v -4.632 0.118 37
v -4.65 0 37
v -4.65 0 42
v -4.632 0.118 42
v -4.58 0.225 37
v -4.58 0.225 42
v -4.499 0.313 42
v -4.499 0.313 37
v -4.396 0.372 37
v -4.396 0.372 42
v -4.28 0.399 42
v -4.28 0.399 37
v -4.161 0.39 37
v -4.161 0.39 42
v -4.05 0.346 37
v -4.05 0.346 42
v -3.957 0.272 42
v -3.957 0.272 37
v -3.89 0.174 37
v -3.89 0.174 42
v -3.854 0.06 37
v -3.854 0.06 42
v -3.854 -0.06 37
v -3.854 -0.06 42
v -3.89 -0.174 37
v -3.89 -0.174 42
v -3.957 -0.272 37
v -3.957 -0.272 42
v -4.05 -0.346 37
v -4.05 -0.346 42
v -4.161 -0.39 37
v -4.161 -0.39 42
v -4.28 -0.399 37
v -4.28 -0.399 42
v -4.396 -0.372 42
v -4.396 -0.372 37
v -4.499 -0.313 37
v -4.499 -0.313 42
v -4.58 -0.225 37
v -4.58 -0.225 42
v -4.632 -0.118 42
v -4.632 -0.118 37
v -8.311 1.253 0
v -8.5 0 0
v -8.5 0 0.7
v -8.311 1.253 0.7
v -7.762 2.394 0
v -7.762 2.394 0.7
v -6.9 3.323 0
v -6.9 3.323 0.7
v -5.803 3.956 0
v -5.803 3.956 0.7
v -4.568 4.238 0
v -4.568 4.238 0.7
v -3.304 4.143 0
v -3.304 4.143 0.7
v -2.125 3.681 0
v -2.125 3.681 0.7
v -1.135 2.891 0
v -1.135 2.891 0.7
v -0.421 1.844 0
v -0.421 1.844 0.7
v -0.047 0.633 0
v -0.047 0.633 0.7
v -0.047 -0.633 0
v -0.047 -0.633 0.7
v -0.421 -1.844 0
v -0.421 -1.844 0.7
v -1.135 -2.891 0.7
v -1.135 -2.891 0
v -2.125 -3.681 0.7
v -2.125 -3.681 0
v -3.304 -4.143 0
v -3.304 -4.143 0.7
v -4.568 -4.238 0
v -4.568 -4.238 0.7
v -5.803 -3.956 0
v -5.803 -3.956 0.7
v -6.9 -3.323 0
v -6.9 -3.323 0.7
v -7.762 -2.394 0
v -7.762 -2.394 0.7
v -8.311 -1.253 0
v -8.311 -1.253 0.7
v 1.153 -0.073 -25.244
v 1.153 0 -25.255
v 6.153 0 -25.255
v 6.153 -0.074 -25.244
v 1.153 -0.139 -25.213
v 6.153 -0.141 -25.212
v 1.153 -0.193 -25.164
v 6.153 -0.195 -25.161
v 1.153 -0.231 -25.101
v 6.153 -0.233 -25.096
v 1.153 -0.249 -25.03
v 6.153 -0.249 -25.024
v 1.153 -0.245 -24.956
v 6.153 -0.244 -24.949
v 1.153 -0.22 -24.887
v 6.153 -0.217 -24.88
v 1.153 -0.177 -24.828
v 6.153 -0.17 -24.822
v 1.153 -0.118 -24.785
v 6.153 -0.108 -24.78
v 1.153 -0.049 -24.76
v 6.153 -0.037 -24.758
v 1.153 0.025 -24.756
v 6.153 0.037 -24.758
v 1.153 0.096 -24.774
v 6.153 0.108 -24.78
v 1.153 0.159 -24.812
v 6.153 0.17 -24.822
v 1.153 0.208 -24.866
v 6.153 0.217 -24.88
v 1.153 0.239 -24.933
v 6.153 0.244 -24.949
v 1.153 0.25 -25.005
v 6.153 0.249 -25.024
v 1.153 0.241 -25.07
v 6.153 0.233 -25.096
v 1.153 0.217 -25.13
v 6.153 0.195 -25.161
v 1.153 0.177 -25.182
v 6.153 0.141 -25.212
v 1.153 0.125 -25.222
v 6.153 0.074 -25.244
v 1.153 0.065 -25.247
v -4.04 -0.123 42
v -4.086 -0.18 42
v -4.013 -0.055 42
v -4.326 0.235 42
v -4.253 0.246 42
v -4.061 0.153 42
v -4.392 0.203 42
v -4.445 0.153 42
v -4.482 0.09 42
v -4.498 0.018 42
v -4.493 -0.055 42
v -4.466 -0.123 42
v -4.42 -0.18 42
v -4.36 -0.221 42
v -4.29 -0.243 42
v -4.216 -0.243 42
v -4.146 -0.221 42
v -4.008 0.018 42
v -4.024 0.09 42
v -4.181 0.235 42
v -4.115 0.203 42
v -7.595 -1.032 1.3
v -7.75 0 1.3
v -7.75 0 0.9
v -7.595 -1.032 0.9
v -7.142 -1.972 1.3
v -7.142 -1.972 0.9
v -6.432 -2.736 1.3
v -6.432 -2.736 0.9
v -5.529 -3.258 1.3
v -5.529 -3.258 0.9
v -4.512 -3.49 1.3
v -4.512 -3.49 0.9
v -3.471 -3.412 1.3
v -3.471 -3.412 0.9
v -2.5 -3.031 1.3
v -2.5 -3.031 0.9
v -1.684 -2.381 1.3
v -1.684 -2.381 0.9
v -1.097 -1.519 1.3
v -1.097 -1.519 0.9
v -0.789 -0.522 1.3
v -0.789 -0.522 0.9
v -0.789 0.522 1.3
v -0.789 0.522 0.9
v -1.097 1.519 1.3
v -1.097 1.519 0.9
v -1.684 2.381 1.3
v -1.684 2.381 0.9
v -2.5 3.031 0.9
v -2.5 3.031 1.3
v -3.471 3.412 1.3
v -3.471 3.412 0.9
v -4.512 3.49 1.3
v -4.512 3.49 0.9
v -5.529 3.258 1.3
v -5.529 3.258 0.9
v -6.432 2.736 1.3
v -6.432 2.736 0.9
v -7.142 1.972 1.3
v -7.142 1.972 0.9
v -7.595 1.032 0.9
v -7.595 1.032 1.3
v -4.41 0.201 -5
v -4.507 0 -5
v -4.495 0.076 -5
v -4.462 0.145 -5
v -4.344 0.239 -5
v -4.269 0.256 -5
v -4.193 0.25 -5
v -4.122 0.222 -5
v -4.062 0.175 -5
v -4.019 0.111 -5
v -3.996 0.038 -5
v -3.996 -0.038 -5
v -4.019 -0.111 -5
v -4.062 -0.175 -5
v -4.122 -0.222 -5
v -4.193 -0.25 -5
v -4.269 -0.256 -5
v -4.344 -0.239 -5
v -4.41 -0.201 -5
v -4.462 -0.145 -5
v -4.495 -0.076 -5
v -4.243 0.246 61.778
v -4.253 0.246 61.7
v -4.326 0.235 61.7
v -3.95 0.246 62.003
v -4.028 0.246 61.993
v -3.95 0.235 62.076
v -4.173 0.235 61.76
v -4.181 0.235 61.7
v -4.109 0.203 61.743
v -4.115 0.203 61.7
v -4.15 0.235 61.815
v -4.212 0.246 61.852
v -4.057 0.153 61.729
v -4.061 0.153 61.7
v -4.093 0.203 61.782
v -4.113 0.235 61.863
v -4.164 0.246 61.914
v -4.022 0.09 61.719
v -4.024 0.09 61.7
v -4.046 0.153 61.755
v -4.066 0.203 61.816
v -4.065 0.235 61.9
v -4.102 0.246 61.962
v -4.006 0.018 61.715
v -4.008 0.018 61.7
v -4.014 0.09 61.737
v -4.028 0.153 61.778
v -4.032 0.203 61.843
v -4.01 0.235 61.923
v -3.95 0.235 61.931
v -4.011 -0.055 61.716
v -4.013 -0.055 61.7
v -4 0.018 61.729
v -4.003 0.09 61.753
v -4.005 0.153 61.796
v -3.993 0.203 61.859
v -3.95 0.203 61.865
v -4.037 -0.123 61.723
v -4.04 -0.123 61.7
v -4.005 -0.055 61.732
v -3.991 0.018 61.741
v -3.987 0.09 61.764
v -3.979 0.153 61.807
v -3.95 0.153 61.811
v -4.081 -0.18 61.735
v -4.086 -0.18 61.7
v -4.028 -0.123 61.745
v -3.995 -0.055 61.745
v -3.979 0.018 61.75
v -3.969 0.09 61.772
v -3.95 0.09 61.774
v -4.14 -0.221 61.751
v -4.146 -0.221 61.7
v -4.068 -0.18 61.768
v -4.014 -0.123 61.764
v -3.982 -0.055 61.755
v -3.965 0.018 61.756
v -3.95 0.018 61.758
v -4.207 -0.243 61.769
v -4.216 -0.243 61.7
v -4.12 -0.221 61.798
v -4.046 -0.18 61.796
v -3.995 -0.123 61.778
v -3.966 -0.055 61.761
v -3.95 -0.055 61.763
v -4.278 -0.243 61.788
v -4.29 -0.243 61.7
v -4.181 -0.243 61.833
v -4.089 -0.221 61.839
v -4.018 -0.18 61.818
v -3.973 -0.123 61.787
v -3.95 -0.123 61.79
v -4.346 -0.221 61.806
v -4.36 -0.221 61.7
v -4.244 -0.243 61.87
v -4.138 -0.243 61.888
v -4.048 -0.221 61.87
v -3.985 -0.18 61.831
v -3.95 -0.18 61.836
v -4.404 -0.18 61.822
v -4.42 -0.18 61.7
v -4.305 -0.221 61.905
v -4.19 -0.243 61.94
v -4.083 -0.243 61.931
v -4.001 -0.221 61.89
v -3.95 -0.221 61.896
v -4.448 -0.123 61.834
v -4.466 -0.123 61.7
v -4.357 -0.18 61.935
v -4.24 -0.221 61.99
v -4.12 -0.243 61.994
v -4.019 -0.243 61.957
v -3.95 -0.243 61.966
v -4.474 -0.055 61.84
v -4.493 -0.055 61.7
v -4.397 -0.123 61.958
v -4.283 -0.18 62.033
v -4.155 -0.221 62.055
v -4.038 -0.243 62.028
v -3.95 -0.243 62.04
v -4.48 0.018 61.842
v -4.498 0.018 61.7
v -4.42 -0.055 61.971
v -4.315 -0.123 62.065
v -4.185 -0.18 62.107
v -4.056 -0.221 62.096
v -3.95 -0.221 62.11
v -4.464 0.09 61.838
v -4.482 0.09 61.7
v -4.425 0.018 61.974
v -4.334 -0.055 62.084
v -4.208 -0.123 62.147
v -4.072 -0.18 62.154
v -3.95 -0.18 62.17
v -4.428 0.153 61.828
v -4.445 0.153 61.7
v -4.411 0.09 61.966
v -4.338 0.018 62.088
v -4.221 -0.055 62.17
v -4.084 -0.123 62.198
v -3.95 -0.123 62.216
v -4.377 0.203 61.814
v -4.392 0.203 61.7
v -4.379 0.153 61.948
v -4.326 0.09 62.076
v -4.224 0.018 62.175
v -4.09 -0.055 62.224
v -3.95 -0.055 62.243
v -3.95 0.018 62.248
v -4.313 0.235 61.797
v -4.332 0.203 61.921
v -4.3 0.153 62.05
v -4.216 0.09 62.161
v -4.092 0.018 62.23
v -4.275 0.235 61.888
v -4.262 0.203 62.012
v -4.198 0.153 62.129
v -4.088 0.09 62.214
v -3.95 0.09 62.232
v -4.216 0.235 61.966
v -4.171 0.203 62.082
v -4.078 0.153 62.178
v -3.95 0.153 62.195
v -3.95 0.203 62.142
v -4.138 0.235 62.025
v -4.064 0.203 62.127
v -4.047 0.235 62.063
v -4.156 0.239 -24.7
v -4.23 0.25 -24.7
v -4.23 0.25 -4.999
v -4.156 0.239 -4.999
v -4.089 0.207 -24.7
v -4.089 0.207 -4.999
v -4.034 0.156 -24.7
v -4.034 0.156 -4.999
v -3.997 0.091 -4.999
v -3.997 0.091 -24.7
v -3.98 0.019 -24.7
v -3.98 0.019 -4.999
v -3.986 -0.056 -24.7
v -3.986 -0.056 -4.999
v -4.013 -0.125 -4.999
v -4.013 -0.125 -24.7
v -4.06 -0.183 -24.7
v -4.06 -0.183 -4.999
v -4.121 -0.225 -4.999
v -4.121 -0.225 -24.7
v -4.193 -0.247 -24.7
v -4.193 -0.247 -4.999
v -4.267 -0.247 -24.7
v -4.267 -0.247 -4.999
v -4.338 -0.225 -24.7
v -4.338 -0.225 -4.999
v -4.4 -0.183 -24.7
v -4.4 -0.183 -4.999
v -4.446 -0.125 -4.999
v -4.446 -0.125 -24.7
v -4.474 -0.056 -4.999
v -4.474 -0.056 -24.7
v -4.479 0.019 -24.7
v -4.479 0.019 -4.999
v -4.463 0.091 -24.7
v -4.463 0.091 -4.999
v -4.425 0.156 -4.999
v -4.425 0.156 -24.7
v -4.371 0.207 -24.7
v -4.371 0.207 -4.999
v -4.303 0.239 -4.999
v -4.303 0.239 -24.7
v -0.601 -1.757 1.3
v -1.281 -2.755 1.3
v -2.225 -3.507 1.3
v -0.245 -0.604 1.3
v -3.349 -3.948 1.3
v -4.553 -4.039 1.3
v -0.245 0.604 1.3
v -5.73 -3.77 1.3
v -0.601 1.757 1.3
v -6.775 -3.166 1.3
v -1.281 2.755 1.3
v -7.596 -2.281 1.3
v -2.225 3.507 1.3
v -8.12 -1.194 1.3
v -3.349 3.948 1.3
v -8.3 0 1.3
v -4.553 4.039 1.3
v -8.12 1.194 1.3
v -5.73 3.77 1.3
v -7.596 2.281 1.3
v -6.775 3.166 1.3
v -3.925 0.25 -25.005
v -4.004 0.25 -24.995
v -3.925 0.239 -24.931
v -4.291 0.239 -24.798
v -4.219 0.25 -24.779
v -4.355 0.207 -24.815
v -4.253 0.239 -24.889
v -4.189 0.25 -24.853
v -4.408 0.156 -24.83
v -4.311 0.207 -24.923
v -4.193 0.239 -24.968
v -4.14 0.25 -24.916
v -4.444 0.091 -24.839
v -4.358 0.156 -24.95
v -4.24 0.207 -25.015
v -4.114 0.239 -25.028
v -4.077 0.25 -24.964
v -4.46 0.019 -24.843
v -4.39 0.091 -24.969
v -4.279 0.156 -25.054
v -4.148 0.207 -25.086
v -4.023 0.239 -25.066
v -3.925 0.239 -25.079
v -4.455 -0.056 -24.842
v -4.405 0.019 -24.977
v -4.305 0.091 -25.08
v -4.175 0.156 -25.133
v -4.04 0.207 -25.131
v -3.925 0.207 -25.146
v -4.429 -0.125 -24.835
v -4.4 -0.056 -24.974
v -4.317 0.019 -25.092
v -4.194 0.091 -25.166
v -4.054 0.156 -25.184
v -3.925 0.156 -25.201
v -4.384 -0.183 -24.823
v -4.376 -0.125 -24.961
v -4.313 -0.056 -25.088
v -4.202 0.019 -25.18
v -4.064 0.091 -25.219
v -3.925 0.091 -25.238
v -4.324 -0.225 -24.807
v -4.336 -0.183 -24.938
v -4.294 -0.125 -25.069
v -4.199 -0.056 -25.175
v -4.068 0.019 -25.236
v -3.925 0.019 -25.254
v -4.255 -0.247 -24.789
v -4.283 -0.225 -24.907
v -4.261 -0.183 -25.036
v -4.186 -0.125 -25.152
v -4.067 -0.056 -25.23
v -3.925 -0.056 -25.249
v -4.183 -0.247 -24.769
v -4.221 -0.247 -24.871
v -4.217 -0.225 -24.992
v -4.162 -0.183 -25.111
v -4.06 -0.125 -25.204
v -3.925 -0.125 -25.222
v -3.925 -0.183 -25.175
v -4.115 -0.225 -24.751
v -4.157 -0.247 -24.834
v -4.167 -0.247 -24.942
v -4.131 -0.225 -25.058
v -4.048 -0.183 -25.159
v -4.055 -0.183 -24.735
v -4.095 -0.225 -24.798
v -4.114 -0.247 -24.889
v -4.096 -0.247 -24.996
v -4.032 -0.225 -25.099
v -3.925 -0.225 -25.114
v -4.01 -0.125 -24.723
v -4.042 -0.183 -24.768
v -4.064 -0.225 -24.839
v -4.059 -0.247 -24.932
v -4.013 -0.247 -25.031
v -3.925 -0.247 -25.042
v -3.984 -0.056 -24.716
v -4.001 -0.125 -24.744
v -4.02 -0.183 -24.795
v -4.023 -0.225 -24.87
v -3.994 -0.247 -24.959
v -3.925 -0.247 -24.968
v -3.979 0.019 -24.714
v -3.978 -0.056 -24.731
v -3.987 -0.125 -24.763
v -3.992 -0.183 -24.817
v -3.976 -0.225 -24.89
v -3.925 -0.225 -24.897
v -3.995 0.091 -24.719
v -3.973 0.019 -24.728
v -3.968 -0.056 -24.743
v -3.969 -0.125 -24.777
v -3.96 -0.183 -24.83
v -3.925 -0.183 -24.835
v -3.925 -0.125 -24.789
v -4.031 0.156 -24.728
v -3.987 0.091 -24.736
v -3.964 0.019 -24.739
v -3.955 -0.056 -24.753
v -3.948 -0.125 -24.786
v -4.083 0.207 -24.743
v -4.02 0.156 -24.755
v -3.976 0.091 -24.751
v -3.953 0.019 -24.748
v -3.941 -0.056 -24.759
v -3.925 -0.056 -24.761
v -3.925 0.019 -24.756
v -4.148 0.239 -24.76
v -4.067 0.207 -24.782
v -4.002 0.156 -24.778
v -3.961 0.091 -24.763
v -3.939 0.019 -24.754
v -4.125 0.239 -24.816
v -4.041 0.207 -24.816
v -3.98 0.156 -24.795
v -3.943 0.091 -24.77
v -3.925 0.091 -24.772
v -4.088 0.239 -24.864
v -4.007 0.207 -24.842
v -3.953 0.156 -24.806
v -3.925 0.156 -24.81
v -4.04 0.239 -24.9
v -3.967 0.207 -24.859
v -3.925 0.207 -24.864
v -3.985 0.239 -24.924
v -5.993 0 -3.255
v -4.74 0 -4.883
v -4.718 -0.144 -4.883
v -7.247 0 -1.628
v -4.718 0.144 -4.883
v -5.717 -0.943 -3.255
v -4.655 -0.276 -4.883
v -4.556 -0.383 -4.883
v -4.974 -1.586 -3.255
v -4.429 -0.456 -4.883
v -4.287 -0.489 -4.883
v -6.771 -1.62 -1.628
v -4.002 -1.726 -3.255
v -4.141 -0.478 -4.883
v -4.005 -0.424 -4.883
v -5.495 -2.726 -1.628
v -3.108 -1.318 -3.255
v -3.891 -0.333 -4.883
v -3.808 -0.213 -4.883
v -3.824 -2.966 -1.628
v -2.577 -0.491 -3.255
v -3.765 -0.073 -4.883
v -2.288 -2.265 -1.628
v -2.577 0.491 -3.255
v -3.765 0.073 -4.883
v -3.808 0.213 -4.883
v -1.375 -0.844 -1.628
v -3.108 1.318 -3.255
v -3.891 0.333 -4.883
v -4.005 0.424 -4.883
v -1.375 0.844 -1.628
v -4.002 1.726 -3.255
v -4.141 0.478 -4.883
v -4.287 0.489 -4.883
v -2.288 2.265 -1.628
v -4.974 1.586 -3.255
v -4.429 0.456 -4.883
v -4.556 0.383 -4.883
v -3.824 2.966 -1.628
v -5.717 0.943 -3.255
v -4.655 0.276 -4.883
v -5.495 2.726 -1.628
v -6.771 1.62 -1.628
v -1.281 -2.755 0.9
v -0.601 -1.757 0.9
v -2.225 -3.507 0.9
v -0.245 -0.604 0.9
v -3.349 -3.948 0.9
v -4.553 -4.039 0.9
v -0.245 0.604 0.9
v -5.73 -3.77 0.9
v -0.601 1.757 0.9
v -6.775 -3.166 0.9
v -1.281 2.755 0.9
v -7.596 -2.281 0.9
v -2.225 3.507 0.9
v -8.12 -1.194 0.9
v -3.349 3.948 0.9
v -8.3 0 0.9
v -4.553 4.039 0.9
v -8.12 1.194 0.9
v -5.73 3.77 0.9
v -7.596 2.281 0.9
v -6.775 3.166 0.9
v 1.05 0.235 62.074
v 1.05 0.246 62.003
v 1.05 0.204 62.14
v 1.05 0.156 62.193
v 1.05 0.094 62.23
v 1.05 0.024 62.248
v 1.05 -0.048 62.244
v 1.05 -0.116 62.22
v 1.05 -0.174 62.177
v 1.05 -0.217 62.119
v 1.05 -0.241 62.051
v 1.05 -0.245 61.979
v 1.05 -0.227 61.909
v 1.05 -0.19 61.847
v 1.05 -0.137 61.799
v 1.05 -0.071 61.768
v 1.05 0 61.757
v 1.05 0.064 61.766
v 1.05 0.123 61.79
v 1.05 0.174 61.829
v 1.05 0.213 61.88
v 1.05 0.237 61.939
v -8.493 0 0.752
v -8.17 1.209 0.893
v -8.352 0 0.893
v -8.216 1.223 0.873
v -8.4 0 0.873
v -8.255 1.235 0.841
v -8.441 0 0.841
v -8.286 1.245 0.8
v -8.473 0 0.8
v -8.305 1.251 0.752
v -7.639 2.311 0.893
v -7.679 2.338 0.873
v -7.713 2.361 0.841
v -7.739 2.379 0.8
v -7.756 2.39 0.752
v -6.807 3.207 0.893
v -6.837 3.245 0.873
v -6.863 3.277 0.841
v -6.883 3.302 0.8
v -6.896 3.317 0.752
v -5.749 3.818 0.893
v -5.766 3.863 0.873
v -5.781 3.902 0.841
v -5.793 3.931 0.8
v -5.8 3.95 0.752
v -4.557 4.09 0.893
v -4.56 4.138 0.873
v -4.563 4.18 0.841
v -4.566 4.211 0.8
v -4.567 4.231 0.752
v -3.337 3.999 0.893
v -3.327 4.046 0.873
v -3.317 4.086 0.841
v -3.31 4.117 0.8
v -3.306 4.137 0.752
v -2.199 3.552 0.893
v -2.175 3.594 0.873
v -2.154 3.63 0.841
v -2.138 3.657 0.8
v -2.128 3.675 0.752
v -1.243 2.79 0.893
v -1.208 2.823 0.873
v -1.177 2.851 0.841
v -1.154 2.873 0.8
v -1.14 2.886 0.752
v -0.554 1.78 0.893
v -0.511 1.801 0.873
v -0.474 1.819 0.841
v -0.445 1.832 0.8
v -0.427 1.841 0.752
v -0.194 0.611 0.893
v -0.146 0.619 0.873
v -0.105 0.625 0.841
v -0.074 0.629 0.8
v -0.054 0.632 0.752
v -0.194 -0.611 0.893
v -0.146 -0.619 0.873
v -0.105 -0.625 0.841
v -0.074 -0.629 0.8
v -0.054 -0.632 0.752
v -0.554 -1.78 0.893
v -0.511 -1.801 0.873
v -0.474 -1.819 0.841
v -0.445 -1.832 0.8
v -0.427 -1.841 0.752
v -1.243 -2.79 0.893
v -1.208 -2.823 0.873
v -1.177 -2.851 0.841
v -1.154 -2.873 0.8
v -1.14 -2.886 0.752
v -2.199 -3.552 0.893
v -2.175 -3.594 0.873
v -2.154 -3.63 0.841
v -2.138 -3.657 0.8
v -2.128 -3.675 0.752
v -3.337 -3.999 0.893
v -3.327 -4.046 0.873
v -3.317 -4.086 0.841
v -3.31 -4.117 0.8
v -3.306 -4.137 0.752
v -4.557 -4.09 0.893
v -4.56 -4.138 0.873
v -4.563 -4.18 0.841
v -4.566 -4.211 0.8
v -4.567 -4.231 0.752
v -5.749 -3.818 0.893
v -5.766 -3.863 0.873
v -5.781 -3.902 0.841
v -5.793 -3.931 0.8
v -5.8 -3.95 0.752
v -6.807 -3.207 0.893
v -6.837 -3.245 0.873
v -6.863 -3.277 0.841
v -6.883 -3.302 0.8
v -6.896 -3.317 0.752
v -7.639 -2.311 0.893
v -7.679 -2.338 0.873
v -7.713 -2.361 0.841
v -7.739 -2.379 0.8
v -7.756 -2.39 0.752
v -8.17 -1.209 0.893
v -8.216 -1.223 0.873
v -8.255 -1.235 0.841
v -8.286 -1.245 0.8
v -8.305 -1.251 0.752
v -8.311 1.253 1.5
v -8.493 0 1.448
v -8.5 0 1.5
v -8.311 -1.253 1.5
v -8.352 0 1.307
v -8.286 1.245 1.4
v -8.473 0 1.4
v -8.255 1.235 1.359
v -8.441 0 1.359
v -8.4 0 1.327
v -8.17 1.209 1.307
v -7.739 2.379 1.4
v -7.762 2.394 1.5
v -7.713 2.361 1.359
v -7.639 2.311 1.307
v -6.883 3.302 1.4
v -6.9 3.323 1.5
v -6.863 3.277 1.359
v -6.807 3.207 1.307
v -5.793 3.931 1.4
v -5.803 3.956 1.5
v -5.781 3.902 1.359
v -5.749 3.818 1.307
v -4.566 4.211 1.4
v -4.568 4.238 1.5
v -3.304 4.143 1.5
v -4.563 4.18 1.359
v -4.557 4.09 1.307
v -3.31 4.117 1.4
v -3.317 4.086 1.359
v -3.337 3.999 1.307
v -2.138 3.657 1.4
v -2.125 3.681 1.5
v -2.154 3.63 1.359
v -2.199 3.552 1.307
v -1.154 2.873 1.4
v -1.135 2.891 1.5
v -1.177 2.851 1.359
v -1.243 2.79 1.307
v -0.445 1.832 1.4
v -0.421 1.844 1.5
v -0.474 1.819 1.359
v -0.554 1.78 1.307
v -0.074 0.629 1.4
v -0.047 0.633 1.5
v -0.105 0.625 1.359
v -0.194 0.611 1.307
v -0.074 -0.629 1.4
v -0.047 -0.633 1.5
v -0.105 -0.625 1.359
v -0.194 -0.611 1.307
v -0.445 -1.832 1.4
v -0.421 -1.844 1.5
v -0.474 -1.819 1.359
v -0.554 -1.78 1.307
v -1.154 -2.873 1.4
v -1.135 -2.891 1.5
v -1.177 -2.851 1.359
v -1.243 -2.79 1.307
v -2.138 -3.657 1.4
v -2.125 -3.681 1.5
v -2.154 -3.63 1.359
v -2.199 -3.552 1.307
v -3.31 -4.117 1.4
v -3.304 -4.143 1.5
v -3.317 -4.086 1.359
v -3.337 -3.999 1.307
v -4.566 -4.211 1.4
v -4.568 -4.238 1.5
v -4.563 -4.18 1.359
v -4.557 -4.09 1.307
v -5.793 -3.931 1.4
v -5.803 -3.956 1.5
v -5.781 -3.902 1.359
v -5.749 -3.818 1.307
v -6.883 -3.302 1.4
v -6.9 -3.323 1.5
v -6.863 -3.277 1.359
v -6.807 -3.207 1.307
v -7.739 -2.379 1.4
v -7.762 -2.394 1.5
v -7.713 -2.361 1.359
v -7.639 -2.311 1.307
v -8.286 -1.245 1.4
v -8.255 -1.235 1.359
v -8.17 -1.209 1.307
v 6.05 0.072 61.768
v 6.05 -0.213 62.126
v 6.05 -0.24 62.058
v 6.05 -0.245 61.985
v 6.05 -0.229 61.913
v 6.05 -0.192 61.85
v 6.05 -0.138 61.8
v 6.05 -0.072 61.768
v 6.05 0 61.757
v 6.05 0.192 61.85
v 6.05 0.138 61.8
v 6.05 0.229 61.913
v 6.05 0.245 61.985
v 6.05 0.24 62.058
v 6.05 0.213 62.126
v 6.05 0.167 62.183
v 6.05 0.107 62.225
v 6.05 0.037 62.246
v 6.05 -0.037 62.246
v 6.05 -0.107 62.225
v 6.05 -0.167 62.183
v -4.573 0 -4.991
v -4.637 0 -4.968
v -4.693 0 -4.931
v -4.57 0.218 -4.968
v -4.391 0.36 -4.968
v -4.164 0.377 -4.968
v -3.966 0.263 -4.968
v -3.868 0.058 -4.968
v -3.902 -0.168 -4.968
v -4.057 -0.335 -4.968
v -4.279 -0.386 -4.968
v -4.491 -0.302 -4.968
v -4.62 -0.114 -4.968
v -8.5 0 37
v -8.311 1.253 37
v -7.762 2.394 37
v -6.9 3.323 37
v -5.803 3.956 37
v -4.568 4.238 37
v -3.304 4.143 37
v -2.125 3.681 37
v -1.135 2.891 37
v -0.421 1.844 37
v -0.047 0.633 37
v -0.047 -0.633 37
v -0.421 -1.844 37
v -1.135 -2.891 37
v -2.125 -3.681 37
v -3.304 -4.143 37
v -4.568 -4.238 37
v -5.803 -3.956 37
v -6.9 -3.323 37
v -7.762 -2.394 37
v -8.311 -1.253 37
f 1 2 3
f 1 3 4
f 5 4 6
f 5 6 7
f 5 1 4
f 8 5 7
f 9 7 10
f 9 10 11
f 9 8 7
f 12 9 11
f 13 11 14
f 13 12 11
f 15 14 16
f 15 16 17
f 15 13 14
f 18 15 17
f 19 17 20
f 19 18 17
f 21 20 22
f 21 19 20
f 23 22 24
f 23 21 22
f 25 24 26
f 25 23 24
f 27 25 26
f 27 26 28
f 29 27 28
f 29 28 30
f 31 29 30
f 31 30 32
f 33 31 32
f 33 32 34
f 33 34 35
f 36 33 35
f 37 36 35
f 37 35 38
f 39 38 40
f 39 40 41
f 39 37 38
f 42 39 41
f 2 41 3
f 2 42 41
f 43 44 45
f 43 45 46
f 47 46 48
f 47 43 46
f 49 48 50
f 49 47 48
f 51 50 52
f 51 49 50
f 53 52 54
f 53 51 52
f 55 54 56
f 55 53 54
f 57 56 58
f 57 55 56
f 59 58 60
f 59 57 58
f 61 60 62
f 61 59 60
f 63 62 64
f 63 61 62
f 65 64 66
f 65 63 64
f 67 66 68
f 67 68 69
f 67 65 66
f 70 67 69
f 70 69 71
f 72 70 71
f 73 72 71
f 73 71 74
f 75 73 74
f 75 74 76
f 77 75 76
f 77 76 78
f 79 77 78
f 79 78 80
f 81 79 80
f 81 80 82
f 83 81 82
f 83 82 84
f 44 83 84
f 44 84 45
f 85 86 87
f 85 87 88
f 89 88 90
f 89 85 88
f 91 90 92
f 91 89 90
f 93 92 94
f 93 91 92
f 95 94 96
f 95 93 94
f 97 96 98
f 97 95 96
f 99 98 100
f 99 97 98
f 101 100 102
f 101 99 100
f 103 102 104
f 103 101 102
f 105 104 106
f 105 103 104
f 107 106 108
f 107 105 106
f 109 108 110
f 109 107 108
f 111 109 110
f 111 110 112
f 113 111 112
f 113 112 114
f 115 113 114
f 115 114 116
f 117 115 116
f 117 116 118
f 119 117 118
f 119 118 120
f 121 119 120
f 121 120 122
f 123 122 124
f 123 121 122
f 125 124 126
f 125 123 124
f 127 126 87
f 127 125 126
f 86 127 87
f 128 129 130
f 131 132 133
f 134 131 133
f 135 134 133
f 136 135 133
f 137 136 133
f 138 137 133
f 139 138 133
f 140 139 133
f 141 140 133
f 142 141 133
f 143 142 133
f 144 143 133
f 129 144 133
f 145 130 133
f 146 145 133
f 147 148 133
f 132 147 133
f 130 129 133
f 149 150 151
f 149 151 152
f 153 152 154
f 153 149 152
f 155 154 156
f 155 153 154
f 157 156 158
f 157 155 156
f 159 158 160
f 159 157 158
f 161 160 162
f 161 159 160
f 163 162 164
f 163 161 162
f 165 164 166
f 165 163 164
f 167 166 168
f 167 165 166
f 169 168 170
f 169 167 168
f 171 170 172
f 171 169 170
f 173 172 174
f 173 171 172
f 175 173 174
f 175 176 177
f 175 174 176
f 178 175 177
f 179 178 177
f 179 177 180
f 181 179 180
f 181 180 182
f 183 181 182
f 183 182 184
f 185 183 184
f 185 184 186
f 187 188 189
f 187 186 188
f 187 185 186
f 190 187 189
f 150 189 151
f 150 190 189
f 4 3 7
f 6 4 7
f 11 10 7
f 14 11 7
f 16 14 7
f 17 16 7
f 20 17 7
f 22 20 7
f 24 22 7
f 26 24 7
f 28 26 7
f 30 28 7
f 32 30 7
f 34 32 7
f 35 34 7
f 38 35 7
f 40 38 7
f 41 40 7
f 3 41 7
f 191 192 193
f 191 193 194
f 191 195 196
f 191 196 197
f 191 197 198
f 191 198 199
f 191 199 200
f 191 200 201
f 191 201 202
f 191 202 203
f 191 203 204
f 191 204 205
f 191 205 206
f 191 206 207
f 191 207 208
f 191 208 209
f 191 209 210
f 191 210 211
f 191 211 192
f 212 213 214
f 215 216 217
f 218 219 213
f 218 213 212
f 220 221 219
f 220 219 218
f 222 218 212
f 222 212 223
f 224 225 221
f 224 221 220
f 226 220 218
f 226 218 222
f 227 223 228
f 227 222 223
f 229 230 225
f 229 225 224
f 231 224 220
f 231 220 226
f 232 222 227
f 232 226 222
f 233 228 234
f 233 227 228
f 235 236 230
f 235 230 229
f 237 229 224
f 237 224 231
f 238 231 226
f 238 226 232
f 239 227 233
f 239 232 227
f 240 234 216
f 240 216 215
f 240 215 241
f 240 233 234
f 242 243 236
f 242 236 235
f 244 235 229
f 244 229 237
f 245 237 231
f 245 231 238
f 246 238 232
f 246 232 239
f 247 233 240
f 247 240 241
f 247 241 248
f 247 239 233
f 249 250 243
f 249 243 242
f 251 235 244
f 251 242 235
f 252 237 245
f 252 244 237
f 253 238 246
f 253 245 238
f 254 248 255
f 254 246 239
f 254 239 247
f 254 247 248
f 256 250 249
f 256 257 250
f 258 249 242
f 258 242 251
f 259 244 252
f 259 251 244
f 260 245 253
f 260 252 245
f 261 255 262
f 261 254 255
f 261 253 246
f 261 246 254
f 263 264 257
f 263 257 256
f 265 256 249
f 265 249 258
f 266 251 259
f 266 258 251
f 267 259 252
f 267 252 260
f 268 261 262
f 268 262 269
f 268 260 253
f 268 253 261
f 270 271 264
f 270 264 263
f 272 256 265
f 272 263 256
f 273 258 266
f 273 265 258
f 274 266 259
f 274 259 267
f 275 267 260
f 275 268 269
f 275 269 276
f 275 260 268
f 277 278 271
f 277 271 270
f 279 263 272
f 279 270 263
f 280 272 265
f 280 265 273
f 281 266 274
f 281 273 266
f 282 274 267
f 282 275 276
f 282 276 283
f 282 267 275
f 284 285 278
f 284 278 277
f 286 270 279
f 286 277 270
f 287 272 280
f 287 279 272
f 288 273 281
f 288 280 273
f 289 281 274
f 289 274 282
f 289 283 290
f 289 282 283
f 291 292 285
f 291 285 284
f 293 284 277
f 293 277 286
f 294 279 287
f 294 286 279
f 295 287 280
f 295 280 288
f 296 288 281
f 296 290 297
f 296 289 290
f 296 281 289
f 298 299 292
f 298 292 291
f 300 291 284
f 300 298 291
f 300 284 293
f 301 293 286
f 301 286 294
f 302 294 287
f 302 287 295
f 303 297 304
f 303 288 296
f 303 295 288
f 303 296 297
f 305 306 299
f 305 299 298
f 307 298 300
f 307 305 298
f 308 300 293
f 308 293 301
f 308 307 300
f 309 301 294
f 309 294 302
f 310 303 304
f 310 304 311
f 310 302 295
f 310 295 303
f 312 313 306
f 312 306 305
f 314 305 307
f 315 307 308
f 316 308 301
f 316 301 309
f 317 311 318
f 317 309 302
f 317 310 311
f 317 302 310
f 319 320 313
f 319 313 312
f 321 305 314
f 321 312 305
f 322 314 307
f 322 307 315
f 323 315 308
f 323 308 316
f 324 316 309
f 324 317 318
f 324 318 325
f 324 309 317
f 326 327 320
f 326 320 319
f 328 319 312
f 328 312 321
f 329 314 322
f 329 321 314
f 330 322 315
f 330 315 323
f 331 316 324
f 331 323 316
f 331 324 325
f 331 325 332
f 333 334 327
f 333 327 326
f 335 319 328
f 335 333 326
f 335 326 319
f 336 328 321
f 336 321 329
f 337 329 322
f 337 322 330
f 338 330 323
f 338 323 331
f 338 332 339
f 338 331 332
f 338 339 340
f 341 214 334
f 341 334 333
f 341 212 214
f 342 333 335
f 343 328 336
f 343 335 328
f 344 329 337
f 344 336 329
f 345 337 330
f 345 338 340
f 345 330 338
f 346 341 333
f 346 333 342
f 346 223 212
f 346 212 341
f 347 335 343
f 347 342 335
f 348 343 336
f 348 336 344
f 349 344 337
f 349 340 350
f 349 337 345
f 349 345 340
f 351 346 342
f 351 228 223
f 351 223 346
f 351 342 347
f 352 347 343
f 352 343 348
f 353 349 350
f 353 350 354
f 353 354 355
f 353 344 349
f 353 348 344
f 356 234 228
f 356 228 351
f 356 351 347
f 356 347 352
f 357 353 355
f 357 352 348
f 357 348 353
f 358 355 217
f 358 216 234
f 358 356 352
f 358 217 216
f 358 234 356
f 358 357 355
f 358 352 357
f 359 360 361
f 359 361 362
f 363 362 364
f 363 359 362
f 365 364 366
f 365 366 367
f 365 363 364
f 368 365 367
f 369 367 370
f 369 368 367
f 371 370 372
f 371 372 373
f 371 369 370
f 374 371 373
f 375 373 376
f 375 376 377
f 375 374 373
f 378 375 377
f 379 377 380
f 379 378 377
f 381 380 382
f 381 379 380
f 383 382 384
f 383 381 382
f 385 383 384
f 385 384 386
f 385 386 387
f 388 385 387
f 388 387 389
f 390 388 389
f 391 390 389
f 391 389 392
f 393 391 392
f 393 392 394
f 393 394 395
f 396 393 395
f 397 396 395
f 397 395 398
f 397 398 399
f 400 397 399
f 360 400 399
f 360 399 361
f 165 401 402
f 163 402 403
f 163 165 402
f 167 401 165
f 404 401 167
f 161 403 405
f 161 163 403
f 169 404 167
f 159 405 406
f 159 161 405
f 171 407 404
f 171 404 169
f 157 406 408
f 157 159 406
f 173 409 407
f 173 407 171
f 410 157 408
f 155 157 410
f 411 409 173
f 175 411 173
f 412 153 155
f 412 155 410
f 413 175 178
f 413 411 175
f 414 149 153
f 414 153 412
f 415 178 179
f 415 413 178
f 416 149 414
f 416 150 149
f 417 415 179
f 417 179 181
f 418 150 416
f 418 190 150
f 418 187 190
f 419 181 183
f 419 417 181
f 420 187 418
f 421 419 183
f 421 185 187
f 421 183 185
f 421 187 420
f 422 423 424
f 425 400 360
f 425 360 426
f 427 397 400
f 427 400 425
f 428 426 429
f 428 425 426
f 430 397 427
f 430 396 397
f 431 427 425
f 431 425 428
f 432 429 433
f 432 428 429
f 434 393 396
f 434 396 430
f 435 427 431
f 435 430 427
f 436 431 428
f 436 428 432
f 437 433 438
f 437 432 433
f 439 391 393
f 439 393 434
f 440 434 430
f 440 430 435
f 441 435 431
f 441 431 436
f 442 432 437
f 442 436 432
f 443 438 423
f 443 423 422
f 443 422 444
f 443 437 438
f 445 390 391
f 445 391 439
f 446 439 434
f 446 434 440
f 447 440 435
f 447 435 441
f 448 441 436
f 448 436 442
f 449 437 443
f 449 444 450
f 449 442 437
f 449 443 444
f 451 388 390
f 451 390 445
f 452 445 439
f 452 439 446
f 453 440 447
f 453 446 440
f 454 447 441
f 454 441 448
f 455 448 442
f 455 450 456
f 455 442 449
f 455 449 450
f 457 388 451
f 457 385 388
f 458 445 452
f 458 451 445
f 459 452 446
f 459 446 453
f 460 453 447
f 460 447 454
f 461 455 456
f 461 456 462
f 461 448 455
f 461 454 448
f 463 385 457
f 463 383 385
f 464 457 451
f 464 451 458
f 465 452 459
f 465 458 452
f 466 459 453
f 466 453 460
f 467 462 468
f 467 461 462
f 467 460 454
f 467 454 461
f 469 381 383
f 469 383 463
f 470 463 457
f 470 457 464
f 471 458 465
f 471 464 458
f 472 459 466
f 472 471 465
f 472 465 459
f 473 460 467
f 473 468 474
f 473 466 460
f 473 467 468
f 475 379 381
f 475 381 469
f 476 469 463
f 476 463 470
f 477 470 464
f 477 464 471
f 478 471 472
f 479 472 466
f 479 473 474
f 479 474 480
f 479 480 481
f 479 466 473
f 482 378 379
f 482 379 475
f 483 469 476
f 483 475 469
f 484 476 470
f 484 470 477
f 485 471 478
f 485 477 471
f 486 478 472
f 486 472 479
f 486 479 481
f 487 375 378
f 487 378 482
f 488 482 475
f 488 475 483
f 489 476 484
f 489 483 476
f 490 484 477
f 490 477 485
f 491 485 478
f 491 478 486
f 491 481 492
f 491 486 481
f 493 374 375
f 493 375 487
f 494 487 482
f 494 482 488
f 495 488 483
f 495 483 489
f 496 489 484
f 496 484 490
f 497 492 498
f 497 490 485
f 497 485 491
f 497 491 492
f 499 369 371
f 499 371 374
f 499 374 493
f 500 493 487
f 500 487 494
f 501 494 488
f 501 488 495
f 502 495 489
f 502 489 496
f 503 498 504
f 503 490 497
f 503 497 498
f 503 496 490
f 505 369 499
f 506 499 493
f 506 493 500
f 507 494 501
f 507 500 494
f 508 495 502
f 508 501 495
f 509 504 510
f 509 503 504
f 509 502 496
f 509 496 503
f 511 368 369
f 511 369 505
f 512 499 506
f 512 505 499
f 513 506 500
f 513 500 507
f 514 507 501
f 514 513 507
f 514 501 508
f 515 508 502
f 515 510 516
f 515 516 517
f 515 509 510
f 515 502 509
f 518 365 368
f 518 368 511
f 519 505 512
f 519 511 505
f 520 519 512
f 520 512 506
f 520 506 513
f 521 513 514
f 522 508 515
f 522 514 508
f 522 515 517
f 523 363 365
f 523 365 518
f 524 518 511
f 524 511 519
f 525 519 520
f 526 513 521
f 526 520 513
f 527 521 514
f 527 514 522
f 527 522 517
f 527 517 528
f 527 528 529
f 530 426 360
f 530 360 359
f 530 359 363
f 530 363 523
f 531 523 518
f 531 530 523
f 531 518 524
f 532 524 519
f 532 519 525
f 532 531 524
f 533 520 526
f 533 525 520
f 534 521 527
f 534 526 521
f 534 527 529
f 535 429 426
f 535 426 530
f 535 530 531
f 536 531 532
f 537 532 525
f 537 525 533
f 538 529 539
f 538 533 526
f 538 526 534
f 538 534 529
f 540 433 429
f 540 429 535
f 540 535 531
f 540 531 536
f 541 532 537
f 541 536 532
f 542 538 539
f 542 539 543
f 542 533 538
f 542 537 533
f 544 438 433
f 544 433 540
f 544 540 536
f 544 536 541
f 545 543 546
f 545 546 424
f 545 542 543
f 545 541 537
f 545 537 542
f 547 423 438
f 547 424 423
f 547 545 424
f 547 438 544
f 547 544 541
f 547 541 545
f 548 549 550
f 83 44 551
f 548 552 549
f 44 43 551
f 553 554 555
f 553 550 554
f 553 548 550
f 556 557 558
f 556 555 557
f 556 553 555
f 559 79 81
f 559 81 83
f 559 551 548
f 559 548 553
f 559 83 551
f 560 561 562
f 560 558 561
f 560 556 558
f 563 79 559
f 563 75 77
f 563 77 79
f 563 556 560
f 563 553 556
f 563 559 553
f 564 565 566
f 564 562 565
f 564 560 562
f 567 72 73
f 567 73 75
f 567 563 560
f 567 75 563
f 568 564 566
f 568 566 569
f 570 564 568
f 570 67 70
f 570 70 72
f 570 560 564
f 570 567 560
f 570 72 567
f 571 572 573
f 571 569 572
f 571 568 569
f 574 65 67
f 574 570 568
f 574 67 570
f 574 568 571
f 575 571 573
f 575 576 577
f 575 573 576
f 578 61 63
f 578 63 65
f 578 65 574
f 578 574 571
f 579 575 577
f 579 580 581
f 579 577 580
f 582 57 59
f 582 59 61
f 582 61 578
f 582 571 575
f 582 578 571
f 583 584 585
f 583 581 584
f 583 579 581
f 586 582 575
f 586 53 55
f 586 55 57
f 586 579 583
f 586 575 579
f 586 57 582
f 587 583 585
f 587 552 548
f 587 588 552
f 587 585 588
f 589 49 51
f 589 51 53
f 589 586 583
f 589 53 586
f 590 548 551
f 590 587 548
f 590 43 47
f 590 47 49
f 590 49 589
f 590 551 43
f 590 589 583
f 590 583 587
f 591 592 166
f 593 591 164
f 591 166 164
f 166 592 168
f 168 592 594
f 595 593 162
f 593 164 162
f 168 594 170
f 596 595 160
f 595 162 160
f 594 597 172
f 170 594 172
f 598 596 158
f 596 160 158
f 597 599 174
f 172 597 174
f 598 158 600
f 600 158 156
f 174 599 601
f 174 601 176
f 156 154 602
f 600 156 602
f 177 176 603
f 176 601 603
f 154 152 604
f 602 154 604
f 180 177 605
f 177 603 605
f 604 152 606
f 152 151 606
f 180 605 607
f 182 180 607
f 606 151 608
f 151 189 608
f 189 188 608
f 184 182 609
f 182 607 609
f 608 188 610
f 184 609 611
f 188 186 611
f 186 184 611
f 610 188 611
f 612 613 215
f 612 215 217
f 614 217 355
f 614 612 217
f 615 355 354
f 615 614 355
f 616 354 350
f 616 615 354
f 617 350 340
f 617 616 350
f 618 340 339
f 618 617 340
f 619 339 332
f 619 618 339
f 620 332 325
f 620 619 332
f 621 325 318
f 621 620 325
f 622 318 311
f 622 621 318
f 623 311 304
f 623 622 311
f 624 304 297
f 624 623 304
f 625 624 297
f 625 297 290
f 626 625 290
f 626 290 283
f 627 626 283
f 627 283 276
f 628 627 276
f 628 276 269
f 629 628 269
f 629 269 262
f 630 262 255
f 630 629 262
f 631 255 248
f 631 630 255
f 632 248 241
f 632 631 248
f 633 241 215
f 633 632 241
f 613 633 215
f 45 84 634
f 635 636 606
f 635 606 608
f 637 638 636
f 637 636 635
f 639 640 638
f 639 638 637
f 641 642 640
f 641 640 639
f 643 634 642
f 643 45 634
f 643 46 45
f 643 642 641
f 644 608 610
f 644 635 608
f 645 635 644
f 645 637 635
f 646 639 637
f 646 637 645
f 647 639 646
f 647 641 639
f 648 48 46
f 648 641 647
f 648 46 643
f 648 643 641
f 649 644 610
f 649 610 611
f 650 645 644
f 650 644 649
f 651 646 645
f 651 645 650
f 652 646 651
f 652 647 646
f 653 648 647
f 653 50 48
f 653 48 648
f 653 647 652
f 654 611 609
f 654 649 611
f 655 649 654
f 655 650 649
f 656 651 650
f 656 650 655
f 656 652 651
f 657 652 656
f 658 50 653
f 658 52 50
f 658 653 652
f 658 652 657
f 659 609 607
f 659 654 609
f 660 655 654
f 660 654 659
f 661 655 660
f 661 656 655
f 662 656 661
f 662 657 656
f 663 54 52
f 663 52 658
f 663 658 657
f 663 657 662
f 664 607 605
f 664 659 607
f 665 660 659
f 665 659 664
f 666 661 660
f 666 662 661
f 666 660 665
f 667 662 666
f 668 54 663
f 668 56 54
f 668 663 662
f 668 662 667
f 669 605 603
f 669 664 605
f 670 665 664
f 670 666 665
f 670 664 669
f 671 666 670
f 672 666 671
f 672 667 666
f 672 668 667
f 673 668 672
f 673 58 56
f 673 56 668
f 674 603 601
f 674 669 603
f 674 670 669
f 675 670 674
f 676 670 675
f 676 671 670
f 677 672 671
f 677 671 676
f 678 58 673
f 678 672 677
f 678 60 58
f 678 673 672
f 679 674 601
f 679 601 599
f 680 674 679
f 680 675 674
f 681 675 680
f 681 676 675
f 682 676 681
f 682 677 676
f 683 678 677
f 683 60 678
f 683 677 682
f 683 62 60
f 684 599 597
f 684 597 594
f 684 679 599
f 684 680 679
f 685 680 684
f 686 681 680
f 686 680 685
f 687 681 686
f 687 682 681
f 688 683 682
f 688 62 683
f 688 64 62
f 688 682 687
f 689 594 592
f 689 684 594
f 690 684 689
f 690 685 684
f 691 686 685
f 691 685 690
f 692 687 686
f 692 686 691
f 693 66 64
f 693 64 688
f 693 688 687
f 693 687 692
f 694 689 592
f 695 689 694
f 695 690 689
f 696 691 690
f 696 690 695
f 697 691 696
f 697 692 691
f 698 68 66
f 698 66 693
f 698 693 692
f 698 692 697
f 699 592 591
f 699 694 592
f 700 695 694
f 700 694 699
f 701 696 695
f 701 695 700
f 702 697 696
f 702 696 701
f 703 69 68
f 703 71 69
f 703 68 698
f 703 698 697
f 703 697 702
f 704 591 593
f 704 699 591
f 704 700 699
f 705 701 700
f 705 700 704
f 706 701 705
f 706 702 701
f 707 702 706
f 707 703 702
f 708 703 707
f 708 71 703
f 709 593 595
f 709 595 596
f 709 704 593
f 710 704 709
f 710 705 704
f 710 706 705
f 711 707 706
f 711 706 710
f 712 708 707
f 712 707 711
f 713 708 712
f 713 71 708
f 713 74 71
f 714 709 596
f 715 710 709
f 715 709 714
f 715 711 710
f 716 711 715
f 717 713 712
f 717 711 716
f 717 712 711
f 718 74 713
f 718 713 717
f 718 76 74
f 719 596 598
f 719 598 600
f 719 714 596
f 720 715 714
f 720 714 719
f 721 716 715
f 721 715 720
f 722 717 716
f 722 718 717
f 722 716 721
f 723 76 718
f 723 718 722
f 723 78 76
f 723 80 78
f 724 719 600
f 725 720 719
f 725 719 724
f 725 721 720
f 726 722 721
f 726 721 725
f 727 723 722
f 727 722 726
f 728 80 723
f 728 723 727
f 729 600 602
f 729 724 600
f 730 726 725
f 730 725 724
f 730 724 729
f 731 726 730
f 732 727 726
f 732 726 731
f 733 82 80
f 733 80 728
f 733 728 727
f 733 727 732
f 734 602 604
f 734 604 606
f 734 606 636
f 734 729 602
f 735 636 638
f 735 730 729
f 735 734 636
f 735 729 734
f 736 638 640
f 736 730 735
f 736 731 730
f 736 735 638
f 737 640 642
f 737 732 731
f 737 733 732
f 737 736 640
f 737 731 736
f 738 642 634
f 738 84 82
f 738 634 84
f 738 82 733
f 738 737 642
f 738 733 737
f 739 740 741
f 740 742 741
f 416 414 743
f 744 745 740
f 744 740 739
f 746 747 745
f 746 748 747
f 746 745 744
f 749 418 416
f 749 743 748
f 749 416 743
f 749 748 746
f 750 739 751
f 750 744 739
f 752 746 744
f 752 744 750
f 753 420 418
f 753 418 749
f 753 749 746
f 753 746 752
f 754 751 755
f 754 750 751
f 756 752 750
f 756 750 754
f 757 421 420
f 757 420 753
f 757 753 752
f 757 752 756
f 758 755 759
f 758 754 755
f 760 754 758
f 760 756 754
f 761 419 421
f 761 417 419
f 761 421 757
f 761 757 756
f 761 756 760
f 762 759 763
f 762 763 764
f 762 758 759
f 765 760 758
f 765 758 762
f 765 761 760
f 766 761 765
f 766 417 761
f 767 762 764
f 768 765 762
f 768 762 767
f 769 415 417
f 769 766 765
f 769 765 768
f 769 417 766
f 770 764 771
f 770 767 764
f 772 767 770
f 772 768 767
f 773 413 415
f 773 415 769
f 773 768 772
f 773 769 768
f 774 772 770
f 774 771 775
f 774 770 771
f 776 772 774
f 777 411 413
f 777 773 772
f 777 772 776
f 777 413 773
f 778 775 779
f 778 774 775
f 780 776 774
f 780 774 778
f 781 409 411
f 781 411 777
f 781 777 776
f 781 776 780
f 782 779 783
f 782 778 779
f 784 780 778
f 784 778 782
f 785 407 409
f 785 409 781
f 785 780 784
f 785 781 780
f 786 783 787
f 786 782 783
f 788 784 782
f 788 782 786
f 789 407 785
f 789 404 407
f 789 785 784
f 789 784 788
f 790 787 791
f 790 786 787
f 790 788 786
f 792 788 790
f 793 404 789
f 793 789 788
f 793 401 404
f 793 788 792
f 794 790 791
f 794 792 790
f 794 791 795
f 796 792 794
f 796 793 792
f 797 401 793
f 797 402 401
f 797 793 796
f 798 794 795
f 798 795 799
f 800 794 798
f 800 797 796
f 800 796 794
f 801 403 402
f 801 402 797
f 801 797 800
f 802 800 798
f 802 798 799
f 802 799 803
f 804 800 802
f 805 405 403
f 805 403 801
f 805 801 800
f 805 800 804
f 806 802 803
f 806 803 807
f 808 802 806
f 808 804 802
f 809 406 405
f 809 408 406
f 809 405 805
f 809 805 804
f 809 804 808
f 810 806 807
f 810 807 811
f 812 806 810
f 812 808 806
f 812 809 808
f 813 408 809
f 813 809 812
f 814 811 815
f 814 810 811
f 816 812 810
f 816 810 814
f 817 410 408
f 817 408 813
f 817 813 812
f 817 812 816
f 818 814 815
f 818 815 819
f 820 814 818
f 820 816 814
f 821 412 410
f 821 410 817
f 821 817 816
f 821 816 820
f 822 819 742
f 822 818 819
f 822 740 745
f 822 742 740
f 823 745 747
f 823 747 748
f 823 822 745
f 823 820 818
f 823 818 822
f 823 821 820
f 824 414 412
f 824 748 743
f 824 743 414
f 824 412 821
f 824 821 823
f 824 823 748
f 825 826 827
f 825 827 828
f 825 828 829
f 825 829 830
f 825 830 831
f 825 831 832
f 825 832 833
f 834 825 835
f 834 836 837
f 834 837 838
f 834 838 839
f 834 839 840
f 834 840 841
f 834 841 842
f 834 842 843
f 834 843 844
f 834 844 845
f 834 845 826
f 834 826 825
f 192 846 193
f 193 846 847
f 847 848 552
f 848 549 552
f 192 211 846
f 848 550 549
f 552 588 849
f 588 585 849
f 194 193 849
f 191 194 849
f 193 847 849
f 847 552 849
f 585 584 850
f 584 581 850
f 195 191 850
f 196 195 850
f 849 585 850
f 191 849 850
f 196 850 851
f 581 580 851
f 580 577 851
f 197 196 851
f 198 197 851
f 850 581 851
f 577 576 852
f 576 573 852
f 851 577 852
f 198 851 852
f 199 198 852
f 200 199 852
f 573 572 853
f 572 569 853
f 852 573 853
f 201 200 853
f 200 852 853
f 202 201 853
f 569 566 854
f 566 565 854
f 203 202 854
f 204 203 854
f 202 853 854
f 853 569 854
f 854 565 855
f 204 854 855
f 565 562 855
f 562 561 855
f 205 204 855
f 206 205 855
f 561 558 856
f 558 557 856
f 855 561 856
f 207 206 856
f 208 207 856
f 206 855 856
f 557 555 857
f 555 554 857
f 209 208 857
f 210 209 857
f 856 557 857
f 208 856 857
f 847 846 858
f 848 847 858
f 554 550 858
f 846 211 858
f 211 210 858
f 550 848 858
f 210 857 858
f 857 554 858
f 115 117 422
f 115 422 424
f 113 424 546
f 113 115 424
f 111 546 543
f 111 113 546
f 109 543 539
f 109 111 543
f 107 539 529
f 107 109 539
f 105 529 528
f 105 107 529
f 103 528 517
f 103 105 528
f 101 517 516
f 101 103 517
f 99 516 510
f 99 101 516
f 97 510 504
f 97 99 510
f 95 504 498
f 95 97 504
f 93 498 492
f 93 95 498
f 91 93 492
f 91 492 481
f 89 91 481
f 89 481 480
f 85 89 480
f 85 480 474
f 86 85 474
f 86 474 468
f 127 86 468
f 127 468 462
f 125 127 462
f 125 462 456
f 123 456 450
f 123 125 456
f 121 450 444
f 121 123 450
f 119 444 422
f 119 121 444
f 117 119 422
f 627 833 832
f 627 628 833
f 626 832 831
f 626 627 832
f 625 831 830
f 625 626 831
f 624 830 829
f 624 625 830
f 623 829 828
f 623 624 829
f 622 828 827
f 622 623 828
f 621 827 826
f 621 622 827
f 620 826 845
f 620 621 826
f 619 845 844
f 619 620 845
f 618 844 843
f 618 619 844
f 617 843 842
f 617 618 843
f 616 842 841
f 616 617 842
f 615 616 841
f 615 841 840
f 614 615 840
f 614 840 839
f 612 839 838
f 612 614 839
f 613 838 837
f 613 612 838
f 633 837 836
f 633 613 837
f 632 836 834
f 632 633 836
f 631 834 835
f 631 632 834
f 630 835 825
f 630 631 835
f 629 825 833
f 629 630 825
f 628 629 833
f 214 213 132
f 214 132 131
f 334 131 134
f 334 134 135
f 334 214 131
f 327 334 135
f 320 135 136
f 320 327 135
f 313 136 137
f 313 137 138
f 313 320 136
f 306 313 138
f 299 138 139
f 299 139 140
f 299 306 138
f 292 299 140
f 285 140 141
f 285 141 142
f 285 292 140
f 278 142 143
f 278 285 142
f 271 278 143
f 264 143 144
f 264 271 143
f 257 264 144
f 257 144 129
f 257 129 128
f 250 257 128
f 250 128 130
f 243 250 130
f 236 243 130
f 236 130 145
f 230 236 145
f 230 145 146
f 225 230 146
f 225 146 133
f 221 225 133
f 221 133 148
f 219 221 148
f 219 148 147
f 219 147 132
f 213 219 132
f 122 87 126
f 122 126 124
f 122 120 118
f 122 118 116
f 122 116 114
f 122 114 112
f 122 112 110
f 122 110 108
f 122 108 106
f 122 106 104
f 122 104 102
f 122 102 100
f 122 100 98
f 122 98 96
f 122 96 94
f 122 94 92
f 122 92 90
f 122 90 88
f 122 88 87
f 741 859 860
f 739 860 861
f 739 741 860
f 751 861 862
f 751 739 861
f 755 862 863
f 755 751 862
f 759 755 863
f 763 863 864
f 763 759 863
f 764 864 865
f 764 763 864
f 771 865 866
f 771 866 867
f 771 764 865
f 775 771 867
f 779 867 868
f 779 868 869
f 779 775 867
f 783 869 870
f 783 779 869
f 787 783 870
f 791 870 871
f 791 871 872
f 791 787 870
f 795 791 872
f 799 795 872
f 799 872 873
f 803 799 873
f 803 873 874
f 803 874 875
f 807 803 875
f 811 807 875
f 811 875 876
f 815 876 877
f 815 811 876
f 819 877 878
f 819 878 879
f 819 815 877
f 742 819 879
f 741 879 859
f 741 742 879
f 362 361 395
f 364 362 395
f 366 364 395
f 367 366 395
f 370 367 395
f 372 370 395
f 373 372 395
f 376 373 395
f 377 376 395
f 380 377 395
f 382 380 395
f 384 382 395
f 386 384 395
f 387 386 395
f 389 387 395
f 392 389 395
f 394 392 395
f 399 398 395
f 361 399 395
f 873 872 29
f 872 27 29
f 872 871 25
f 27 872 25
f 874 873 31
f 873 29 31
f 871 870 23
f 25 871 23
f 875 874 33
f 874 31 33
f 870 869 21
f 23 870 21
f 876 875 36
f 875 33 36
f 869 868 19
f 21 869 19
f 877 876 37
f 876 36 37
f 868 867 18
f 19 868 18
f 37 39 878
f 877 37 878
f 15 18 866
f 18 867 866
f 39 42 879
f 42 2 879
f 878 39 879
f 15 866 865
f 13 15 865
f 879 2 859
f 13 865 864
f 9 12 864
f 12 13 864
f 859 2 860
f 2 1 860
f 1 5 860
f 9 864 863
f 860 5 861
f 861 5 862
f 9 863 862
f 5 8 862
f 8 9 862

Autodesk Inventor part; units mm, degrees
ref_plane "YZ Plane" through (0, 0, 0) normal (1, 0, 0) x (0, 1, 0)
ref_plane "XZ Plane" through (0, 0, 0) normal (0, 1, 0) x (-1, 0, 0)
ref_plane "XY Plane" through (0, 0, 0) normal (0, 0, 1) x (1, 0, 0)
sketch "Sketch1" plane through (0, 0, 0) normal (0, 1, 0) x (-1, 0, 0)
  line L0 (4.5, 42) -> (4, 42)
  line L1 (-5.9955, 62) -> (-5.9955, 61.75)
  line L2 (-5.9955, 62) -> (-5.9955, 62.25)
  line L3 (4.25, 42) -> (4.25, 61.7)
  arc A0 (4.25, 61.7) -> (3.95, 62) centre (3.95, 61.7) ccw
  line L4 (3.95, 62) -> (-1.05, 62)
  point P0 (0, 0)
sketch "Sketch3" plane through (0, 0, 0) normal (1, 0, 0) x (0, 1, 0)
  circle A0 centre (0, -25.0051) radius 0.25
  point P0 (0, 0)
sketch "Sketch5" plane through (0, 0, 0) normal (0, 1, 0) x (-1, 0, 0)
  line L0 (8.5, 37) -> (0, 37)
  line L1 (4.0039, 37) -> (3.3039, 37)
  line L2 (0, 37) -> (4.25, 37)
  line L3 (4.25, 42) -> (3.85, 42)
  line L4 (4.25, 42) -> (4.65, 42)
  line L5 (4.65, 42) -> (4.65, 37)
  line L6 (3.85, 42) -> (3.85, 37)
  line L7 (4.25, 42) -> (4, 42)
  line L8 (4.25, 42) -> (4.5, 42)
  line L9 (4.5, 42) -> (4.5, 61.7)
  line L10 (4.2, 62) -> (4.0045, 62)
  line L11 (4.5024, -5) -> (3.9976, -5)
  line L12 (4.7401, -4.883) -> (8.5, 0)
  line L13 (3.7599, -4.883) -> (0, 0)
  line L14 (4.25, -5) -> (4, -5)
  line L15 (4.25, -5) -> (4.5066, -5)
  line L16 (4.25, -5) -> (4.5066, -5)
  line L17 (4.5066, -5) -> (4.5066, -24.7)
  line L18 (4.2066, -25) -> (4.0066, -25)
  line L19 (4.25, 0.9) -> (7.75, 0.9)
  line L20 (4.25, 0.9) -> (0.75, 0.9)
  line L21 (7.75, 0.9) -> (7.75, 1.3)
  line L22 (7.75, 1.3) -> (0.75, 1.3)
  line L23 (0.75, 1.3) -> (0.75, 0.9)
  line L24 (0.75, 0.9) -> (0, 0.9)
  line L25 (7.75, 0.9) -> (8.5, 0.9)
  line L26 (7.75, 1.3) -> (8.5, 1.3)
  line L27 (0.75, 1.3) -> (0, 1.3)
  line L28 (8.5, 37) -> (8.5, 1.3)
  line L29 (0, 37) -> (0, 1.3)
  line L30 (8.5, 0.9) -> (8.5, 0)
  line L31 (0, 0.9) -> (0, 0)
  arc A0 (4.5024, -5) -> (4.7401, -4.883) centre (4.5024, -4.7) ccw
  arc A1 (3.7599, -4.883) -> (3.9976, -5) centre (3.9976, -4.7) ccw
  line L32 (3.6976, -24.5) -> (-5.9934, -24.5)
  line L33 (4.0066, -25) -> (-5.9934, -25)
  line L34 (-5.9934, -25) -> (-5.9934, -24.5)
  line L35 (3.9976, -24.2) -> (3.9976, -5)
  line L36 (3.7, 61.5) -> (-5.9955, 61.5)
  line L37 (-5.9955, 61.5) -> (-5.9955, 62)
  line L38 (-5.9955, 62) -> (4.0045, 62)
  line L39 (4, 61.2) -> (4, 42)
  line L40 (4.25, 37) -> (4.25, 1.3)
  line L41 (4.25, 1.3) -> (4.25, -5)
  line L42 (4.25, 37) -> (4.25, 42)
  line L43 (4.25, 42) -> (4.25, 61.5)
  arc A2 (4.25, 61.5) -> (3.9684, 61.75) centre (3.892, 61.3803) ccw
  line L44 (3.9684, 61.75) -> (-5.9955, 61.75)
  arc A3 (4.5, 61.7) -> (4.2, 62) centre (4.2, 61.7) ccw
  arc A4 (4, 61.2) -> (3.7, 61.5) centre (3.7, 61.2) ccw
  line L45 (4.25, -5) -> (4.25, -24.5071)
  arc A5 (3.9999, -24.75) -> (4.25, -24.5071) centre (4.007, -24.5071) ccw
  line L46 (3.9999, -24.75) -> (-5.9934, -24.75)
  arc A6 (3.6976, -24.5) -> (3.9976, -24.2) centre (3.6976, -24.2) ccw
  arc A7 (4.2066, -25) -> (4.5066, -24.7) centre (4.2066, -24.7) ccw
sketch "Sketch6" plane through (0, 0, 0) normal (0, 1, 0) x (-1, 0, 0)
  line L0 (4.2294, -4.9987) -> (4.2294, -24.7)
  line L1 (3.9247, -25.0047) -> (-1.1526, -25.0047)
  arc A0 (3.9247, -25.0047) -> (4.2294, -24.7) centre (3.9247, -24.7) ccw
sketch "Sketch7" plane through (0, 0, 0) normal (1, 0, 0) x (0, 1, 0)
  circle A0 centre (0, 62.0031) radius 0.2458
  point P0 (0, 0)
  point P1 (0, 0)
revolve "Revolution1" add sketch "Sketch5" angle 360 about axis through (-4.25, 0, 37) along (0, 0, -1) contours L28 L26 L22 L40 L0 | L0 L42 L4 L5 | L21 L19 L41 L22 | L25 L30 L12 A0 L15 L11 L41 L19
sweep "Sweep4" add profiles "Sketch7" path "Sketch1" separate body path curves L4 A0 L3
fillet "Fillet1" radius 0.2 2 edges at (0, 0, 0.9) (0, 0, 1.3)
sketch "Sketch8" plane through (1.05, 0, 62.0031) normal (1, 0, 0) x (0, 0, -1)
  circle A0 centre (0, 0) radius 0.2458 projected
  circle A1 centre (0, 0) radius 0.2458
  point P0 (62.0031, 0)
extrude "Extrusion1" add sketch "Sketch8" along normal blind 5 bodies 2
sweep "Sweep5" add profiles "Sketch3" path "Sketch6" separate body
sketch "Sketch10" plane through (1.1526, 0, -25.0051) normal (1, 0, 0) x (0, 0, -1)
  circle A0 centre (0, 0) radius 0.25
  point P0 (-25.0051, 0)
extrude "Extrusion3" add sketch "Sketch10" along normal blind 5 bodies 3
properties part number "K50 – 29" material "Copper"
